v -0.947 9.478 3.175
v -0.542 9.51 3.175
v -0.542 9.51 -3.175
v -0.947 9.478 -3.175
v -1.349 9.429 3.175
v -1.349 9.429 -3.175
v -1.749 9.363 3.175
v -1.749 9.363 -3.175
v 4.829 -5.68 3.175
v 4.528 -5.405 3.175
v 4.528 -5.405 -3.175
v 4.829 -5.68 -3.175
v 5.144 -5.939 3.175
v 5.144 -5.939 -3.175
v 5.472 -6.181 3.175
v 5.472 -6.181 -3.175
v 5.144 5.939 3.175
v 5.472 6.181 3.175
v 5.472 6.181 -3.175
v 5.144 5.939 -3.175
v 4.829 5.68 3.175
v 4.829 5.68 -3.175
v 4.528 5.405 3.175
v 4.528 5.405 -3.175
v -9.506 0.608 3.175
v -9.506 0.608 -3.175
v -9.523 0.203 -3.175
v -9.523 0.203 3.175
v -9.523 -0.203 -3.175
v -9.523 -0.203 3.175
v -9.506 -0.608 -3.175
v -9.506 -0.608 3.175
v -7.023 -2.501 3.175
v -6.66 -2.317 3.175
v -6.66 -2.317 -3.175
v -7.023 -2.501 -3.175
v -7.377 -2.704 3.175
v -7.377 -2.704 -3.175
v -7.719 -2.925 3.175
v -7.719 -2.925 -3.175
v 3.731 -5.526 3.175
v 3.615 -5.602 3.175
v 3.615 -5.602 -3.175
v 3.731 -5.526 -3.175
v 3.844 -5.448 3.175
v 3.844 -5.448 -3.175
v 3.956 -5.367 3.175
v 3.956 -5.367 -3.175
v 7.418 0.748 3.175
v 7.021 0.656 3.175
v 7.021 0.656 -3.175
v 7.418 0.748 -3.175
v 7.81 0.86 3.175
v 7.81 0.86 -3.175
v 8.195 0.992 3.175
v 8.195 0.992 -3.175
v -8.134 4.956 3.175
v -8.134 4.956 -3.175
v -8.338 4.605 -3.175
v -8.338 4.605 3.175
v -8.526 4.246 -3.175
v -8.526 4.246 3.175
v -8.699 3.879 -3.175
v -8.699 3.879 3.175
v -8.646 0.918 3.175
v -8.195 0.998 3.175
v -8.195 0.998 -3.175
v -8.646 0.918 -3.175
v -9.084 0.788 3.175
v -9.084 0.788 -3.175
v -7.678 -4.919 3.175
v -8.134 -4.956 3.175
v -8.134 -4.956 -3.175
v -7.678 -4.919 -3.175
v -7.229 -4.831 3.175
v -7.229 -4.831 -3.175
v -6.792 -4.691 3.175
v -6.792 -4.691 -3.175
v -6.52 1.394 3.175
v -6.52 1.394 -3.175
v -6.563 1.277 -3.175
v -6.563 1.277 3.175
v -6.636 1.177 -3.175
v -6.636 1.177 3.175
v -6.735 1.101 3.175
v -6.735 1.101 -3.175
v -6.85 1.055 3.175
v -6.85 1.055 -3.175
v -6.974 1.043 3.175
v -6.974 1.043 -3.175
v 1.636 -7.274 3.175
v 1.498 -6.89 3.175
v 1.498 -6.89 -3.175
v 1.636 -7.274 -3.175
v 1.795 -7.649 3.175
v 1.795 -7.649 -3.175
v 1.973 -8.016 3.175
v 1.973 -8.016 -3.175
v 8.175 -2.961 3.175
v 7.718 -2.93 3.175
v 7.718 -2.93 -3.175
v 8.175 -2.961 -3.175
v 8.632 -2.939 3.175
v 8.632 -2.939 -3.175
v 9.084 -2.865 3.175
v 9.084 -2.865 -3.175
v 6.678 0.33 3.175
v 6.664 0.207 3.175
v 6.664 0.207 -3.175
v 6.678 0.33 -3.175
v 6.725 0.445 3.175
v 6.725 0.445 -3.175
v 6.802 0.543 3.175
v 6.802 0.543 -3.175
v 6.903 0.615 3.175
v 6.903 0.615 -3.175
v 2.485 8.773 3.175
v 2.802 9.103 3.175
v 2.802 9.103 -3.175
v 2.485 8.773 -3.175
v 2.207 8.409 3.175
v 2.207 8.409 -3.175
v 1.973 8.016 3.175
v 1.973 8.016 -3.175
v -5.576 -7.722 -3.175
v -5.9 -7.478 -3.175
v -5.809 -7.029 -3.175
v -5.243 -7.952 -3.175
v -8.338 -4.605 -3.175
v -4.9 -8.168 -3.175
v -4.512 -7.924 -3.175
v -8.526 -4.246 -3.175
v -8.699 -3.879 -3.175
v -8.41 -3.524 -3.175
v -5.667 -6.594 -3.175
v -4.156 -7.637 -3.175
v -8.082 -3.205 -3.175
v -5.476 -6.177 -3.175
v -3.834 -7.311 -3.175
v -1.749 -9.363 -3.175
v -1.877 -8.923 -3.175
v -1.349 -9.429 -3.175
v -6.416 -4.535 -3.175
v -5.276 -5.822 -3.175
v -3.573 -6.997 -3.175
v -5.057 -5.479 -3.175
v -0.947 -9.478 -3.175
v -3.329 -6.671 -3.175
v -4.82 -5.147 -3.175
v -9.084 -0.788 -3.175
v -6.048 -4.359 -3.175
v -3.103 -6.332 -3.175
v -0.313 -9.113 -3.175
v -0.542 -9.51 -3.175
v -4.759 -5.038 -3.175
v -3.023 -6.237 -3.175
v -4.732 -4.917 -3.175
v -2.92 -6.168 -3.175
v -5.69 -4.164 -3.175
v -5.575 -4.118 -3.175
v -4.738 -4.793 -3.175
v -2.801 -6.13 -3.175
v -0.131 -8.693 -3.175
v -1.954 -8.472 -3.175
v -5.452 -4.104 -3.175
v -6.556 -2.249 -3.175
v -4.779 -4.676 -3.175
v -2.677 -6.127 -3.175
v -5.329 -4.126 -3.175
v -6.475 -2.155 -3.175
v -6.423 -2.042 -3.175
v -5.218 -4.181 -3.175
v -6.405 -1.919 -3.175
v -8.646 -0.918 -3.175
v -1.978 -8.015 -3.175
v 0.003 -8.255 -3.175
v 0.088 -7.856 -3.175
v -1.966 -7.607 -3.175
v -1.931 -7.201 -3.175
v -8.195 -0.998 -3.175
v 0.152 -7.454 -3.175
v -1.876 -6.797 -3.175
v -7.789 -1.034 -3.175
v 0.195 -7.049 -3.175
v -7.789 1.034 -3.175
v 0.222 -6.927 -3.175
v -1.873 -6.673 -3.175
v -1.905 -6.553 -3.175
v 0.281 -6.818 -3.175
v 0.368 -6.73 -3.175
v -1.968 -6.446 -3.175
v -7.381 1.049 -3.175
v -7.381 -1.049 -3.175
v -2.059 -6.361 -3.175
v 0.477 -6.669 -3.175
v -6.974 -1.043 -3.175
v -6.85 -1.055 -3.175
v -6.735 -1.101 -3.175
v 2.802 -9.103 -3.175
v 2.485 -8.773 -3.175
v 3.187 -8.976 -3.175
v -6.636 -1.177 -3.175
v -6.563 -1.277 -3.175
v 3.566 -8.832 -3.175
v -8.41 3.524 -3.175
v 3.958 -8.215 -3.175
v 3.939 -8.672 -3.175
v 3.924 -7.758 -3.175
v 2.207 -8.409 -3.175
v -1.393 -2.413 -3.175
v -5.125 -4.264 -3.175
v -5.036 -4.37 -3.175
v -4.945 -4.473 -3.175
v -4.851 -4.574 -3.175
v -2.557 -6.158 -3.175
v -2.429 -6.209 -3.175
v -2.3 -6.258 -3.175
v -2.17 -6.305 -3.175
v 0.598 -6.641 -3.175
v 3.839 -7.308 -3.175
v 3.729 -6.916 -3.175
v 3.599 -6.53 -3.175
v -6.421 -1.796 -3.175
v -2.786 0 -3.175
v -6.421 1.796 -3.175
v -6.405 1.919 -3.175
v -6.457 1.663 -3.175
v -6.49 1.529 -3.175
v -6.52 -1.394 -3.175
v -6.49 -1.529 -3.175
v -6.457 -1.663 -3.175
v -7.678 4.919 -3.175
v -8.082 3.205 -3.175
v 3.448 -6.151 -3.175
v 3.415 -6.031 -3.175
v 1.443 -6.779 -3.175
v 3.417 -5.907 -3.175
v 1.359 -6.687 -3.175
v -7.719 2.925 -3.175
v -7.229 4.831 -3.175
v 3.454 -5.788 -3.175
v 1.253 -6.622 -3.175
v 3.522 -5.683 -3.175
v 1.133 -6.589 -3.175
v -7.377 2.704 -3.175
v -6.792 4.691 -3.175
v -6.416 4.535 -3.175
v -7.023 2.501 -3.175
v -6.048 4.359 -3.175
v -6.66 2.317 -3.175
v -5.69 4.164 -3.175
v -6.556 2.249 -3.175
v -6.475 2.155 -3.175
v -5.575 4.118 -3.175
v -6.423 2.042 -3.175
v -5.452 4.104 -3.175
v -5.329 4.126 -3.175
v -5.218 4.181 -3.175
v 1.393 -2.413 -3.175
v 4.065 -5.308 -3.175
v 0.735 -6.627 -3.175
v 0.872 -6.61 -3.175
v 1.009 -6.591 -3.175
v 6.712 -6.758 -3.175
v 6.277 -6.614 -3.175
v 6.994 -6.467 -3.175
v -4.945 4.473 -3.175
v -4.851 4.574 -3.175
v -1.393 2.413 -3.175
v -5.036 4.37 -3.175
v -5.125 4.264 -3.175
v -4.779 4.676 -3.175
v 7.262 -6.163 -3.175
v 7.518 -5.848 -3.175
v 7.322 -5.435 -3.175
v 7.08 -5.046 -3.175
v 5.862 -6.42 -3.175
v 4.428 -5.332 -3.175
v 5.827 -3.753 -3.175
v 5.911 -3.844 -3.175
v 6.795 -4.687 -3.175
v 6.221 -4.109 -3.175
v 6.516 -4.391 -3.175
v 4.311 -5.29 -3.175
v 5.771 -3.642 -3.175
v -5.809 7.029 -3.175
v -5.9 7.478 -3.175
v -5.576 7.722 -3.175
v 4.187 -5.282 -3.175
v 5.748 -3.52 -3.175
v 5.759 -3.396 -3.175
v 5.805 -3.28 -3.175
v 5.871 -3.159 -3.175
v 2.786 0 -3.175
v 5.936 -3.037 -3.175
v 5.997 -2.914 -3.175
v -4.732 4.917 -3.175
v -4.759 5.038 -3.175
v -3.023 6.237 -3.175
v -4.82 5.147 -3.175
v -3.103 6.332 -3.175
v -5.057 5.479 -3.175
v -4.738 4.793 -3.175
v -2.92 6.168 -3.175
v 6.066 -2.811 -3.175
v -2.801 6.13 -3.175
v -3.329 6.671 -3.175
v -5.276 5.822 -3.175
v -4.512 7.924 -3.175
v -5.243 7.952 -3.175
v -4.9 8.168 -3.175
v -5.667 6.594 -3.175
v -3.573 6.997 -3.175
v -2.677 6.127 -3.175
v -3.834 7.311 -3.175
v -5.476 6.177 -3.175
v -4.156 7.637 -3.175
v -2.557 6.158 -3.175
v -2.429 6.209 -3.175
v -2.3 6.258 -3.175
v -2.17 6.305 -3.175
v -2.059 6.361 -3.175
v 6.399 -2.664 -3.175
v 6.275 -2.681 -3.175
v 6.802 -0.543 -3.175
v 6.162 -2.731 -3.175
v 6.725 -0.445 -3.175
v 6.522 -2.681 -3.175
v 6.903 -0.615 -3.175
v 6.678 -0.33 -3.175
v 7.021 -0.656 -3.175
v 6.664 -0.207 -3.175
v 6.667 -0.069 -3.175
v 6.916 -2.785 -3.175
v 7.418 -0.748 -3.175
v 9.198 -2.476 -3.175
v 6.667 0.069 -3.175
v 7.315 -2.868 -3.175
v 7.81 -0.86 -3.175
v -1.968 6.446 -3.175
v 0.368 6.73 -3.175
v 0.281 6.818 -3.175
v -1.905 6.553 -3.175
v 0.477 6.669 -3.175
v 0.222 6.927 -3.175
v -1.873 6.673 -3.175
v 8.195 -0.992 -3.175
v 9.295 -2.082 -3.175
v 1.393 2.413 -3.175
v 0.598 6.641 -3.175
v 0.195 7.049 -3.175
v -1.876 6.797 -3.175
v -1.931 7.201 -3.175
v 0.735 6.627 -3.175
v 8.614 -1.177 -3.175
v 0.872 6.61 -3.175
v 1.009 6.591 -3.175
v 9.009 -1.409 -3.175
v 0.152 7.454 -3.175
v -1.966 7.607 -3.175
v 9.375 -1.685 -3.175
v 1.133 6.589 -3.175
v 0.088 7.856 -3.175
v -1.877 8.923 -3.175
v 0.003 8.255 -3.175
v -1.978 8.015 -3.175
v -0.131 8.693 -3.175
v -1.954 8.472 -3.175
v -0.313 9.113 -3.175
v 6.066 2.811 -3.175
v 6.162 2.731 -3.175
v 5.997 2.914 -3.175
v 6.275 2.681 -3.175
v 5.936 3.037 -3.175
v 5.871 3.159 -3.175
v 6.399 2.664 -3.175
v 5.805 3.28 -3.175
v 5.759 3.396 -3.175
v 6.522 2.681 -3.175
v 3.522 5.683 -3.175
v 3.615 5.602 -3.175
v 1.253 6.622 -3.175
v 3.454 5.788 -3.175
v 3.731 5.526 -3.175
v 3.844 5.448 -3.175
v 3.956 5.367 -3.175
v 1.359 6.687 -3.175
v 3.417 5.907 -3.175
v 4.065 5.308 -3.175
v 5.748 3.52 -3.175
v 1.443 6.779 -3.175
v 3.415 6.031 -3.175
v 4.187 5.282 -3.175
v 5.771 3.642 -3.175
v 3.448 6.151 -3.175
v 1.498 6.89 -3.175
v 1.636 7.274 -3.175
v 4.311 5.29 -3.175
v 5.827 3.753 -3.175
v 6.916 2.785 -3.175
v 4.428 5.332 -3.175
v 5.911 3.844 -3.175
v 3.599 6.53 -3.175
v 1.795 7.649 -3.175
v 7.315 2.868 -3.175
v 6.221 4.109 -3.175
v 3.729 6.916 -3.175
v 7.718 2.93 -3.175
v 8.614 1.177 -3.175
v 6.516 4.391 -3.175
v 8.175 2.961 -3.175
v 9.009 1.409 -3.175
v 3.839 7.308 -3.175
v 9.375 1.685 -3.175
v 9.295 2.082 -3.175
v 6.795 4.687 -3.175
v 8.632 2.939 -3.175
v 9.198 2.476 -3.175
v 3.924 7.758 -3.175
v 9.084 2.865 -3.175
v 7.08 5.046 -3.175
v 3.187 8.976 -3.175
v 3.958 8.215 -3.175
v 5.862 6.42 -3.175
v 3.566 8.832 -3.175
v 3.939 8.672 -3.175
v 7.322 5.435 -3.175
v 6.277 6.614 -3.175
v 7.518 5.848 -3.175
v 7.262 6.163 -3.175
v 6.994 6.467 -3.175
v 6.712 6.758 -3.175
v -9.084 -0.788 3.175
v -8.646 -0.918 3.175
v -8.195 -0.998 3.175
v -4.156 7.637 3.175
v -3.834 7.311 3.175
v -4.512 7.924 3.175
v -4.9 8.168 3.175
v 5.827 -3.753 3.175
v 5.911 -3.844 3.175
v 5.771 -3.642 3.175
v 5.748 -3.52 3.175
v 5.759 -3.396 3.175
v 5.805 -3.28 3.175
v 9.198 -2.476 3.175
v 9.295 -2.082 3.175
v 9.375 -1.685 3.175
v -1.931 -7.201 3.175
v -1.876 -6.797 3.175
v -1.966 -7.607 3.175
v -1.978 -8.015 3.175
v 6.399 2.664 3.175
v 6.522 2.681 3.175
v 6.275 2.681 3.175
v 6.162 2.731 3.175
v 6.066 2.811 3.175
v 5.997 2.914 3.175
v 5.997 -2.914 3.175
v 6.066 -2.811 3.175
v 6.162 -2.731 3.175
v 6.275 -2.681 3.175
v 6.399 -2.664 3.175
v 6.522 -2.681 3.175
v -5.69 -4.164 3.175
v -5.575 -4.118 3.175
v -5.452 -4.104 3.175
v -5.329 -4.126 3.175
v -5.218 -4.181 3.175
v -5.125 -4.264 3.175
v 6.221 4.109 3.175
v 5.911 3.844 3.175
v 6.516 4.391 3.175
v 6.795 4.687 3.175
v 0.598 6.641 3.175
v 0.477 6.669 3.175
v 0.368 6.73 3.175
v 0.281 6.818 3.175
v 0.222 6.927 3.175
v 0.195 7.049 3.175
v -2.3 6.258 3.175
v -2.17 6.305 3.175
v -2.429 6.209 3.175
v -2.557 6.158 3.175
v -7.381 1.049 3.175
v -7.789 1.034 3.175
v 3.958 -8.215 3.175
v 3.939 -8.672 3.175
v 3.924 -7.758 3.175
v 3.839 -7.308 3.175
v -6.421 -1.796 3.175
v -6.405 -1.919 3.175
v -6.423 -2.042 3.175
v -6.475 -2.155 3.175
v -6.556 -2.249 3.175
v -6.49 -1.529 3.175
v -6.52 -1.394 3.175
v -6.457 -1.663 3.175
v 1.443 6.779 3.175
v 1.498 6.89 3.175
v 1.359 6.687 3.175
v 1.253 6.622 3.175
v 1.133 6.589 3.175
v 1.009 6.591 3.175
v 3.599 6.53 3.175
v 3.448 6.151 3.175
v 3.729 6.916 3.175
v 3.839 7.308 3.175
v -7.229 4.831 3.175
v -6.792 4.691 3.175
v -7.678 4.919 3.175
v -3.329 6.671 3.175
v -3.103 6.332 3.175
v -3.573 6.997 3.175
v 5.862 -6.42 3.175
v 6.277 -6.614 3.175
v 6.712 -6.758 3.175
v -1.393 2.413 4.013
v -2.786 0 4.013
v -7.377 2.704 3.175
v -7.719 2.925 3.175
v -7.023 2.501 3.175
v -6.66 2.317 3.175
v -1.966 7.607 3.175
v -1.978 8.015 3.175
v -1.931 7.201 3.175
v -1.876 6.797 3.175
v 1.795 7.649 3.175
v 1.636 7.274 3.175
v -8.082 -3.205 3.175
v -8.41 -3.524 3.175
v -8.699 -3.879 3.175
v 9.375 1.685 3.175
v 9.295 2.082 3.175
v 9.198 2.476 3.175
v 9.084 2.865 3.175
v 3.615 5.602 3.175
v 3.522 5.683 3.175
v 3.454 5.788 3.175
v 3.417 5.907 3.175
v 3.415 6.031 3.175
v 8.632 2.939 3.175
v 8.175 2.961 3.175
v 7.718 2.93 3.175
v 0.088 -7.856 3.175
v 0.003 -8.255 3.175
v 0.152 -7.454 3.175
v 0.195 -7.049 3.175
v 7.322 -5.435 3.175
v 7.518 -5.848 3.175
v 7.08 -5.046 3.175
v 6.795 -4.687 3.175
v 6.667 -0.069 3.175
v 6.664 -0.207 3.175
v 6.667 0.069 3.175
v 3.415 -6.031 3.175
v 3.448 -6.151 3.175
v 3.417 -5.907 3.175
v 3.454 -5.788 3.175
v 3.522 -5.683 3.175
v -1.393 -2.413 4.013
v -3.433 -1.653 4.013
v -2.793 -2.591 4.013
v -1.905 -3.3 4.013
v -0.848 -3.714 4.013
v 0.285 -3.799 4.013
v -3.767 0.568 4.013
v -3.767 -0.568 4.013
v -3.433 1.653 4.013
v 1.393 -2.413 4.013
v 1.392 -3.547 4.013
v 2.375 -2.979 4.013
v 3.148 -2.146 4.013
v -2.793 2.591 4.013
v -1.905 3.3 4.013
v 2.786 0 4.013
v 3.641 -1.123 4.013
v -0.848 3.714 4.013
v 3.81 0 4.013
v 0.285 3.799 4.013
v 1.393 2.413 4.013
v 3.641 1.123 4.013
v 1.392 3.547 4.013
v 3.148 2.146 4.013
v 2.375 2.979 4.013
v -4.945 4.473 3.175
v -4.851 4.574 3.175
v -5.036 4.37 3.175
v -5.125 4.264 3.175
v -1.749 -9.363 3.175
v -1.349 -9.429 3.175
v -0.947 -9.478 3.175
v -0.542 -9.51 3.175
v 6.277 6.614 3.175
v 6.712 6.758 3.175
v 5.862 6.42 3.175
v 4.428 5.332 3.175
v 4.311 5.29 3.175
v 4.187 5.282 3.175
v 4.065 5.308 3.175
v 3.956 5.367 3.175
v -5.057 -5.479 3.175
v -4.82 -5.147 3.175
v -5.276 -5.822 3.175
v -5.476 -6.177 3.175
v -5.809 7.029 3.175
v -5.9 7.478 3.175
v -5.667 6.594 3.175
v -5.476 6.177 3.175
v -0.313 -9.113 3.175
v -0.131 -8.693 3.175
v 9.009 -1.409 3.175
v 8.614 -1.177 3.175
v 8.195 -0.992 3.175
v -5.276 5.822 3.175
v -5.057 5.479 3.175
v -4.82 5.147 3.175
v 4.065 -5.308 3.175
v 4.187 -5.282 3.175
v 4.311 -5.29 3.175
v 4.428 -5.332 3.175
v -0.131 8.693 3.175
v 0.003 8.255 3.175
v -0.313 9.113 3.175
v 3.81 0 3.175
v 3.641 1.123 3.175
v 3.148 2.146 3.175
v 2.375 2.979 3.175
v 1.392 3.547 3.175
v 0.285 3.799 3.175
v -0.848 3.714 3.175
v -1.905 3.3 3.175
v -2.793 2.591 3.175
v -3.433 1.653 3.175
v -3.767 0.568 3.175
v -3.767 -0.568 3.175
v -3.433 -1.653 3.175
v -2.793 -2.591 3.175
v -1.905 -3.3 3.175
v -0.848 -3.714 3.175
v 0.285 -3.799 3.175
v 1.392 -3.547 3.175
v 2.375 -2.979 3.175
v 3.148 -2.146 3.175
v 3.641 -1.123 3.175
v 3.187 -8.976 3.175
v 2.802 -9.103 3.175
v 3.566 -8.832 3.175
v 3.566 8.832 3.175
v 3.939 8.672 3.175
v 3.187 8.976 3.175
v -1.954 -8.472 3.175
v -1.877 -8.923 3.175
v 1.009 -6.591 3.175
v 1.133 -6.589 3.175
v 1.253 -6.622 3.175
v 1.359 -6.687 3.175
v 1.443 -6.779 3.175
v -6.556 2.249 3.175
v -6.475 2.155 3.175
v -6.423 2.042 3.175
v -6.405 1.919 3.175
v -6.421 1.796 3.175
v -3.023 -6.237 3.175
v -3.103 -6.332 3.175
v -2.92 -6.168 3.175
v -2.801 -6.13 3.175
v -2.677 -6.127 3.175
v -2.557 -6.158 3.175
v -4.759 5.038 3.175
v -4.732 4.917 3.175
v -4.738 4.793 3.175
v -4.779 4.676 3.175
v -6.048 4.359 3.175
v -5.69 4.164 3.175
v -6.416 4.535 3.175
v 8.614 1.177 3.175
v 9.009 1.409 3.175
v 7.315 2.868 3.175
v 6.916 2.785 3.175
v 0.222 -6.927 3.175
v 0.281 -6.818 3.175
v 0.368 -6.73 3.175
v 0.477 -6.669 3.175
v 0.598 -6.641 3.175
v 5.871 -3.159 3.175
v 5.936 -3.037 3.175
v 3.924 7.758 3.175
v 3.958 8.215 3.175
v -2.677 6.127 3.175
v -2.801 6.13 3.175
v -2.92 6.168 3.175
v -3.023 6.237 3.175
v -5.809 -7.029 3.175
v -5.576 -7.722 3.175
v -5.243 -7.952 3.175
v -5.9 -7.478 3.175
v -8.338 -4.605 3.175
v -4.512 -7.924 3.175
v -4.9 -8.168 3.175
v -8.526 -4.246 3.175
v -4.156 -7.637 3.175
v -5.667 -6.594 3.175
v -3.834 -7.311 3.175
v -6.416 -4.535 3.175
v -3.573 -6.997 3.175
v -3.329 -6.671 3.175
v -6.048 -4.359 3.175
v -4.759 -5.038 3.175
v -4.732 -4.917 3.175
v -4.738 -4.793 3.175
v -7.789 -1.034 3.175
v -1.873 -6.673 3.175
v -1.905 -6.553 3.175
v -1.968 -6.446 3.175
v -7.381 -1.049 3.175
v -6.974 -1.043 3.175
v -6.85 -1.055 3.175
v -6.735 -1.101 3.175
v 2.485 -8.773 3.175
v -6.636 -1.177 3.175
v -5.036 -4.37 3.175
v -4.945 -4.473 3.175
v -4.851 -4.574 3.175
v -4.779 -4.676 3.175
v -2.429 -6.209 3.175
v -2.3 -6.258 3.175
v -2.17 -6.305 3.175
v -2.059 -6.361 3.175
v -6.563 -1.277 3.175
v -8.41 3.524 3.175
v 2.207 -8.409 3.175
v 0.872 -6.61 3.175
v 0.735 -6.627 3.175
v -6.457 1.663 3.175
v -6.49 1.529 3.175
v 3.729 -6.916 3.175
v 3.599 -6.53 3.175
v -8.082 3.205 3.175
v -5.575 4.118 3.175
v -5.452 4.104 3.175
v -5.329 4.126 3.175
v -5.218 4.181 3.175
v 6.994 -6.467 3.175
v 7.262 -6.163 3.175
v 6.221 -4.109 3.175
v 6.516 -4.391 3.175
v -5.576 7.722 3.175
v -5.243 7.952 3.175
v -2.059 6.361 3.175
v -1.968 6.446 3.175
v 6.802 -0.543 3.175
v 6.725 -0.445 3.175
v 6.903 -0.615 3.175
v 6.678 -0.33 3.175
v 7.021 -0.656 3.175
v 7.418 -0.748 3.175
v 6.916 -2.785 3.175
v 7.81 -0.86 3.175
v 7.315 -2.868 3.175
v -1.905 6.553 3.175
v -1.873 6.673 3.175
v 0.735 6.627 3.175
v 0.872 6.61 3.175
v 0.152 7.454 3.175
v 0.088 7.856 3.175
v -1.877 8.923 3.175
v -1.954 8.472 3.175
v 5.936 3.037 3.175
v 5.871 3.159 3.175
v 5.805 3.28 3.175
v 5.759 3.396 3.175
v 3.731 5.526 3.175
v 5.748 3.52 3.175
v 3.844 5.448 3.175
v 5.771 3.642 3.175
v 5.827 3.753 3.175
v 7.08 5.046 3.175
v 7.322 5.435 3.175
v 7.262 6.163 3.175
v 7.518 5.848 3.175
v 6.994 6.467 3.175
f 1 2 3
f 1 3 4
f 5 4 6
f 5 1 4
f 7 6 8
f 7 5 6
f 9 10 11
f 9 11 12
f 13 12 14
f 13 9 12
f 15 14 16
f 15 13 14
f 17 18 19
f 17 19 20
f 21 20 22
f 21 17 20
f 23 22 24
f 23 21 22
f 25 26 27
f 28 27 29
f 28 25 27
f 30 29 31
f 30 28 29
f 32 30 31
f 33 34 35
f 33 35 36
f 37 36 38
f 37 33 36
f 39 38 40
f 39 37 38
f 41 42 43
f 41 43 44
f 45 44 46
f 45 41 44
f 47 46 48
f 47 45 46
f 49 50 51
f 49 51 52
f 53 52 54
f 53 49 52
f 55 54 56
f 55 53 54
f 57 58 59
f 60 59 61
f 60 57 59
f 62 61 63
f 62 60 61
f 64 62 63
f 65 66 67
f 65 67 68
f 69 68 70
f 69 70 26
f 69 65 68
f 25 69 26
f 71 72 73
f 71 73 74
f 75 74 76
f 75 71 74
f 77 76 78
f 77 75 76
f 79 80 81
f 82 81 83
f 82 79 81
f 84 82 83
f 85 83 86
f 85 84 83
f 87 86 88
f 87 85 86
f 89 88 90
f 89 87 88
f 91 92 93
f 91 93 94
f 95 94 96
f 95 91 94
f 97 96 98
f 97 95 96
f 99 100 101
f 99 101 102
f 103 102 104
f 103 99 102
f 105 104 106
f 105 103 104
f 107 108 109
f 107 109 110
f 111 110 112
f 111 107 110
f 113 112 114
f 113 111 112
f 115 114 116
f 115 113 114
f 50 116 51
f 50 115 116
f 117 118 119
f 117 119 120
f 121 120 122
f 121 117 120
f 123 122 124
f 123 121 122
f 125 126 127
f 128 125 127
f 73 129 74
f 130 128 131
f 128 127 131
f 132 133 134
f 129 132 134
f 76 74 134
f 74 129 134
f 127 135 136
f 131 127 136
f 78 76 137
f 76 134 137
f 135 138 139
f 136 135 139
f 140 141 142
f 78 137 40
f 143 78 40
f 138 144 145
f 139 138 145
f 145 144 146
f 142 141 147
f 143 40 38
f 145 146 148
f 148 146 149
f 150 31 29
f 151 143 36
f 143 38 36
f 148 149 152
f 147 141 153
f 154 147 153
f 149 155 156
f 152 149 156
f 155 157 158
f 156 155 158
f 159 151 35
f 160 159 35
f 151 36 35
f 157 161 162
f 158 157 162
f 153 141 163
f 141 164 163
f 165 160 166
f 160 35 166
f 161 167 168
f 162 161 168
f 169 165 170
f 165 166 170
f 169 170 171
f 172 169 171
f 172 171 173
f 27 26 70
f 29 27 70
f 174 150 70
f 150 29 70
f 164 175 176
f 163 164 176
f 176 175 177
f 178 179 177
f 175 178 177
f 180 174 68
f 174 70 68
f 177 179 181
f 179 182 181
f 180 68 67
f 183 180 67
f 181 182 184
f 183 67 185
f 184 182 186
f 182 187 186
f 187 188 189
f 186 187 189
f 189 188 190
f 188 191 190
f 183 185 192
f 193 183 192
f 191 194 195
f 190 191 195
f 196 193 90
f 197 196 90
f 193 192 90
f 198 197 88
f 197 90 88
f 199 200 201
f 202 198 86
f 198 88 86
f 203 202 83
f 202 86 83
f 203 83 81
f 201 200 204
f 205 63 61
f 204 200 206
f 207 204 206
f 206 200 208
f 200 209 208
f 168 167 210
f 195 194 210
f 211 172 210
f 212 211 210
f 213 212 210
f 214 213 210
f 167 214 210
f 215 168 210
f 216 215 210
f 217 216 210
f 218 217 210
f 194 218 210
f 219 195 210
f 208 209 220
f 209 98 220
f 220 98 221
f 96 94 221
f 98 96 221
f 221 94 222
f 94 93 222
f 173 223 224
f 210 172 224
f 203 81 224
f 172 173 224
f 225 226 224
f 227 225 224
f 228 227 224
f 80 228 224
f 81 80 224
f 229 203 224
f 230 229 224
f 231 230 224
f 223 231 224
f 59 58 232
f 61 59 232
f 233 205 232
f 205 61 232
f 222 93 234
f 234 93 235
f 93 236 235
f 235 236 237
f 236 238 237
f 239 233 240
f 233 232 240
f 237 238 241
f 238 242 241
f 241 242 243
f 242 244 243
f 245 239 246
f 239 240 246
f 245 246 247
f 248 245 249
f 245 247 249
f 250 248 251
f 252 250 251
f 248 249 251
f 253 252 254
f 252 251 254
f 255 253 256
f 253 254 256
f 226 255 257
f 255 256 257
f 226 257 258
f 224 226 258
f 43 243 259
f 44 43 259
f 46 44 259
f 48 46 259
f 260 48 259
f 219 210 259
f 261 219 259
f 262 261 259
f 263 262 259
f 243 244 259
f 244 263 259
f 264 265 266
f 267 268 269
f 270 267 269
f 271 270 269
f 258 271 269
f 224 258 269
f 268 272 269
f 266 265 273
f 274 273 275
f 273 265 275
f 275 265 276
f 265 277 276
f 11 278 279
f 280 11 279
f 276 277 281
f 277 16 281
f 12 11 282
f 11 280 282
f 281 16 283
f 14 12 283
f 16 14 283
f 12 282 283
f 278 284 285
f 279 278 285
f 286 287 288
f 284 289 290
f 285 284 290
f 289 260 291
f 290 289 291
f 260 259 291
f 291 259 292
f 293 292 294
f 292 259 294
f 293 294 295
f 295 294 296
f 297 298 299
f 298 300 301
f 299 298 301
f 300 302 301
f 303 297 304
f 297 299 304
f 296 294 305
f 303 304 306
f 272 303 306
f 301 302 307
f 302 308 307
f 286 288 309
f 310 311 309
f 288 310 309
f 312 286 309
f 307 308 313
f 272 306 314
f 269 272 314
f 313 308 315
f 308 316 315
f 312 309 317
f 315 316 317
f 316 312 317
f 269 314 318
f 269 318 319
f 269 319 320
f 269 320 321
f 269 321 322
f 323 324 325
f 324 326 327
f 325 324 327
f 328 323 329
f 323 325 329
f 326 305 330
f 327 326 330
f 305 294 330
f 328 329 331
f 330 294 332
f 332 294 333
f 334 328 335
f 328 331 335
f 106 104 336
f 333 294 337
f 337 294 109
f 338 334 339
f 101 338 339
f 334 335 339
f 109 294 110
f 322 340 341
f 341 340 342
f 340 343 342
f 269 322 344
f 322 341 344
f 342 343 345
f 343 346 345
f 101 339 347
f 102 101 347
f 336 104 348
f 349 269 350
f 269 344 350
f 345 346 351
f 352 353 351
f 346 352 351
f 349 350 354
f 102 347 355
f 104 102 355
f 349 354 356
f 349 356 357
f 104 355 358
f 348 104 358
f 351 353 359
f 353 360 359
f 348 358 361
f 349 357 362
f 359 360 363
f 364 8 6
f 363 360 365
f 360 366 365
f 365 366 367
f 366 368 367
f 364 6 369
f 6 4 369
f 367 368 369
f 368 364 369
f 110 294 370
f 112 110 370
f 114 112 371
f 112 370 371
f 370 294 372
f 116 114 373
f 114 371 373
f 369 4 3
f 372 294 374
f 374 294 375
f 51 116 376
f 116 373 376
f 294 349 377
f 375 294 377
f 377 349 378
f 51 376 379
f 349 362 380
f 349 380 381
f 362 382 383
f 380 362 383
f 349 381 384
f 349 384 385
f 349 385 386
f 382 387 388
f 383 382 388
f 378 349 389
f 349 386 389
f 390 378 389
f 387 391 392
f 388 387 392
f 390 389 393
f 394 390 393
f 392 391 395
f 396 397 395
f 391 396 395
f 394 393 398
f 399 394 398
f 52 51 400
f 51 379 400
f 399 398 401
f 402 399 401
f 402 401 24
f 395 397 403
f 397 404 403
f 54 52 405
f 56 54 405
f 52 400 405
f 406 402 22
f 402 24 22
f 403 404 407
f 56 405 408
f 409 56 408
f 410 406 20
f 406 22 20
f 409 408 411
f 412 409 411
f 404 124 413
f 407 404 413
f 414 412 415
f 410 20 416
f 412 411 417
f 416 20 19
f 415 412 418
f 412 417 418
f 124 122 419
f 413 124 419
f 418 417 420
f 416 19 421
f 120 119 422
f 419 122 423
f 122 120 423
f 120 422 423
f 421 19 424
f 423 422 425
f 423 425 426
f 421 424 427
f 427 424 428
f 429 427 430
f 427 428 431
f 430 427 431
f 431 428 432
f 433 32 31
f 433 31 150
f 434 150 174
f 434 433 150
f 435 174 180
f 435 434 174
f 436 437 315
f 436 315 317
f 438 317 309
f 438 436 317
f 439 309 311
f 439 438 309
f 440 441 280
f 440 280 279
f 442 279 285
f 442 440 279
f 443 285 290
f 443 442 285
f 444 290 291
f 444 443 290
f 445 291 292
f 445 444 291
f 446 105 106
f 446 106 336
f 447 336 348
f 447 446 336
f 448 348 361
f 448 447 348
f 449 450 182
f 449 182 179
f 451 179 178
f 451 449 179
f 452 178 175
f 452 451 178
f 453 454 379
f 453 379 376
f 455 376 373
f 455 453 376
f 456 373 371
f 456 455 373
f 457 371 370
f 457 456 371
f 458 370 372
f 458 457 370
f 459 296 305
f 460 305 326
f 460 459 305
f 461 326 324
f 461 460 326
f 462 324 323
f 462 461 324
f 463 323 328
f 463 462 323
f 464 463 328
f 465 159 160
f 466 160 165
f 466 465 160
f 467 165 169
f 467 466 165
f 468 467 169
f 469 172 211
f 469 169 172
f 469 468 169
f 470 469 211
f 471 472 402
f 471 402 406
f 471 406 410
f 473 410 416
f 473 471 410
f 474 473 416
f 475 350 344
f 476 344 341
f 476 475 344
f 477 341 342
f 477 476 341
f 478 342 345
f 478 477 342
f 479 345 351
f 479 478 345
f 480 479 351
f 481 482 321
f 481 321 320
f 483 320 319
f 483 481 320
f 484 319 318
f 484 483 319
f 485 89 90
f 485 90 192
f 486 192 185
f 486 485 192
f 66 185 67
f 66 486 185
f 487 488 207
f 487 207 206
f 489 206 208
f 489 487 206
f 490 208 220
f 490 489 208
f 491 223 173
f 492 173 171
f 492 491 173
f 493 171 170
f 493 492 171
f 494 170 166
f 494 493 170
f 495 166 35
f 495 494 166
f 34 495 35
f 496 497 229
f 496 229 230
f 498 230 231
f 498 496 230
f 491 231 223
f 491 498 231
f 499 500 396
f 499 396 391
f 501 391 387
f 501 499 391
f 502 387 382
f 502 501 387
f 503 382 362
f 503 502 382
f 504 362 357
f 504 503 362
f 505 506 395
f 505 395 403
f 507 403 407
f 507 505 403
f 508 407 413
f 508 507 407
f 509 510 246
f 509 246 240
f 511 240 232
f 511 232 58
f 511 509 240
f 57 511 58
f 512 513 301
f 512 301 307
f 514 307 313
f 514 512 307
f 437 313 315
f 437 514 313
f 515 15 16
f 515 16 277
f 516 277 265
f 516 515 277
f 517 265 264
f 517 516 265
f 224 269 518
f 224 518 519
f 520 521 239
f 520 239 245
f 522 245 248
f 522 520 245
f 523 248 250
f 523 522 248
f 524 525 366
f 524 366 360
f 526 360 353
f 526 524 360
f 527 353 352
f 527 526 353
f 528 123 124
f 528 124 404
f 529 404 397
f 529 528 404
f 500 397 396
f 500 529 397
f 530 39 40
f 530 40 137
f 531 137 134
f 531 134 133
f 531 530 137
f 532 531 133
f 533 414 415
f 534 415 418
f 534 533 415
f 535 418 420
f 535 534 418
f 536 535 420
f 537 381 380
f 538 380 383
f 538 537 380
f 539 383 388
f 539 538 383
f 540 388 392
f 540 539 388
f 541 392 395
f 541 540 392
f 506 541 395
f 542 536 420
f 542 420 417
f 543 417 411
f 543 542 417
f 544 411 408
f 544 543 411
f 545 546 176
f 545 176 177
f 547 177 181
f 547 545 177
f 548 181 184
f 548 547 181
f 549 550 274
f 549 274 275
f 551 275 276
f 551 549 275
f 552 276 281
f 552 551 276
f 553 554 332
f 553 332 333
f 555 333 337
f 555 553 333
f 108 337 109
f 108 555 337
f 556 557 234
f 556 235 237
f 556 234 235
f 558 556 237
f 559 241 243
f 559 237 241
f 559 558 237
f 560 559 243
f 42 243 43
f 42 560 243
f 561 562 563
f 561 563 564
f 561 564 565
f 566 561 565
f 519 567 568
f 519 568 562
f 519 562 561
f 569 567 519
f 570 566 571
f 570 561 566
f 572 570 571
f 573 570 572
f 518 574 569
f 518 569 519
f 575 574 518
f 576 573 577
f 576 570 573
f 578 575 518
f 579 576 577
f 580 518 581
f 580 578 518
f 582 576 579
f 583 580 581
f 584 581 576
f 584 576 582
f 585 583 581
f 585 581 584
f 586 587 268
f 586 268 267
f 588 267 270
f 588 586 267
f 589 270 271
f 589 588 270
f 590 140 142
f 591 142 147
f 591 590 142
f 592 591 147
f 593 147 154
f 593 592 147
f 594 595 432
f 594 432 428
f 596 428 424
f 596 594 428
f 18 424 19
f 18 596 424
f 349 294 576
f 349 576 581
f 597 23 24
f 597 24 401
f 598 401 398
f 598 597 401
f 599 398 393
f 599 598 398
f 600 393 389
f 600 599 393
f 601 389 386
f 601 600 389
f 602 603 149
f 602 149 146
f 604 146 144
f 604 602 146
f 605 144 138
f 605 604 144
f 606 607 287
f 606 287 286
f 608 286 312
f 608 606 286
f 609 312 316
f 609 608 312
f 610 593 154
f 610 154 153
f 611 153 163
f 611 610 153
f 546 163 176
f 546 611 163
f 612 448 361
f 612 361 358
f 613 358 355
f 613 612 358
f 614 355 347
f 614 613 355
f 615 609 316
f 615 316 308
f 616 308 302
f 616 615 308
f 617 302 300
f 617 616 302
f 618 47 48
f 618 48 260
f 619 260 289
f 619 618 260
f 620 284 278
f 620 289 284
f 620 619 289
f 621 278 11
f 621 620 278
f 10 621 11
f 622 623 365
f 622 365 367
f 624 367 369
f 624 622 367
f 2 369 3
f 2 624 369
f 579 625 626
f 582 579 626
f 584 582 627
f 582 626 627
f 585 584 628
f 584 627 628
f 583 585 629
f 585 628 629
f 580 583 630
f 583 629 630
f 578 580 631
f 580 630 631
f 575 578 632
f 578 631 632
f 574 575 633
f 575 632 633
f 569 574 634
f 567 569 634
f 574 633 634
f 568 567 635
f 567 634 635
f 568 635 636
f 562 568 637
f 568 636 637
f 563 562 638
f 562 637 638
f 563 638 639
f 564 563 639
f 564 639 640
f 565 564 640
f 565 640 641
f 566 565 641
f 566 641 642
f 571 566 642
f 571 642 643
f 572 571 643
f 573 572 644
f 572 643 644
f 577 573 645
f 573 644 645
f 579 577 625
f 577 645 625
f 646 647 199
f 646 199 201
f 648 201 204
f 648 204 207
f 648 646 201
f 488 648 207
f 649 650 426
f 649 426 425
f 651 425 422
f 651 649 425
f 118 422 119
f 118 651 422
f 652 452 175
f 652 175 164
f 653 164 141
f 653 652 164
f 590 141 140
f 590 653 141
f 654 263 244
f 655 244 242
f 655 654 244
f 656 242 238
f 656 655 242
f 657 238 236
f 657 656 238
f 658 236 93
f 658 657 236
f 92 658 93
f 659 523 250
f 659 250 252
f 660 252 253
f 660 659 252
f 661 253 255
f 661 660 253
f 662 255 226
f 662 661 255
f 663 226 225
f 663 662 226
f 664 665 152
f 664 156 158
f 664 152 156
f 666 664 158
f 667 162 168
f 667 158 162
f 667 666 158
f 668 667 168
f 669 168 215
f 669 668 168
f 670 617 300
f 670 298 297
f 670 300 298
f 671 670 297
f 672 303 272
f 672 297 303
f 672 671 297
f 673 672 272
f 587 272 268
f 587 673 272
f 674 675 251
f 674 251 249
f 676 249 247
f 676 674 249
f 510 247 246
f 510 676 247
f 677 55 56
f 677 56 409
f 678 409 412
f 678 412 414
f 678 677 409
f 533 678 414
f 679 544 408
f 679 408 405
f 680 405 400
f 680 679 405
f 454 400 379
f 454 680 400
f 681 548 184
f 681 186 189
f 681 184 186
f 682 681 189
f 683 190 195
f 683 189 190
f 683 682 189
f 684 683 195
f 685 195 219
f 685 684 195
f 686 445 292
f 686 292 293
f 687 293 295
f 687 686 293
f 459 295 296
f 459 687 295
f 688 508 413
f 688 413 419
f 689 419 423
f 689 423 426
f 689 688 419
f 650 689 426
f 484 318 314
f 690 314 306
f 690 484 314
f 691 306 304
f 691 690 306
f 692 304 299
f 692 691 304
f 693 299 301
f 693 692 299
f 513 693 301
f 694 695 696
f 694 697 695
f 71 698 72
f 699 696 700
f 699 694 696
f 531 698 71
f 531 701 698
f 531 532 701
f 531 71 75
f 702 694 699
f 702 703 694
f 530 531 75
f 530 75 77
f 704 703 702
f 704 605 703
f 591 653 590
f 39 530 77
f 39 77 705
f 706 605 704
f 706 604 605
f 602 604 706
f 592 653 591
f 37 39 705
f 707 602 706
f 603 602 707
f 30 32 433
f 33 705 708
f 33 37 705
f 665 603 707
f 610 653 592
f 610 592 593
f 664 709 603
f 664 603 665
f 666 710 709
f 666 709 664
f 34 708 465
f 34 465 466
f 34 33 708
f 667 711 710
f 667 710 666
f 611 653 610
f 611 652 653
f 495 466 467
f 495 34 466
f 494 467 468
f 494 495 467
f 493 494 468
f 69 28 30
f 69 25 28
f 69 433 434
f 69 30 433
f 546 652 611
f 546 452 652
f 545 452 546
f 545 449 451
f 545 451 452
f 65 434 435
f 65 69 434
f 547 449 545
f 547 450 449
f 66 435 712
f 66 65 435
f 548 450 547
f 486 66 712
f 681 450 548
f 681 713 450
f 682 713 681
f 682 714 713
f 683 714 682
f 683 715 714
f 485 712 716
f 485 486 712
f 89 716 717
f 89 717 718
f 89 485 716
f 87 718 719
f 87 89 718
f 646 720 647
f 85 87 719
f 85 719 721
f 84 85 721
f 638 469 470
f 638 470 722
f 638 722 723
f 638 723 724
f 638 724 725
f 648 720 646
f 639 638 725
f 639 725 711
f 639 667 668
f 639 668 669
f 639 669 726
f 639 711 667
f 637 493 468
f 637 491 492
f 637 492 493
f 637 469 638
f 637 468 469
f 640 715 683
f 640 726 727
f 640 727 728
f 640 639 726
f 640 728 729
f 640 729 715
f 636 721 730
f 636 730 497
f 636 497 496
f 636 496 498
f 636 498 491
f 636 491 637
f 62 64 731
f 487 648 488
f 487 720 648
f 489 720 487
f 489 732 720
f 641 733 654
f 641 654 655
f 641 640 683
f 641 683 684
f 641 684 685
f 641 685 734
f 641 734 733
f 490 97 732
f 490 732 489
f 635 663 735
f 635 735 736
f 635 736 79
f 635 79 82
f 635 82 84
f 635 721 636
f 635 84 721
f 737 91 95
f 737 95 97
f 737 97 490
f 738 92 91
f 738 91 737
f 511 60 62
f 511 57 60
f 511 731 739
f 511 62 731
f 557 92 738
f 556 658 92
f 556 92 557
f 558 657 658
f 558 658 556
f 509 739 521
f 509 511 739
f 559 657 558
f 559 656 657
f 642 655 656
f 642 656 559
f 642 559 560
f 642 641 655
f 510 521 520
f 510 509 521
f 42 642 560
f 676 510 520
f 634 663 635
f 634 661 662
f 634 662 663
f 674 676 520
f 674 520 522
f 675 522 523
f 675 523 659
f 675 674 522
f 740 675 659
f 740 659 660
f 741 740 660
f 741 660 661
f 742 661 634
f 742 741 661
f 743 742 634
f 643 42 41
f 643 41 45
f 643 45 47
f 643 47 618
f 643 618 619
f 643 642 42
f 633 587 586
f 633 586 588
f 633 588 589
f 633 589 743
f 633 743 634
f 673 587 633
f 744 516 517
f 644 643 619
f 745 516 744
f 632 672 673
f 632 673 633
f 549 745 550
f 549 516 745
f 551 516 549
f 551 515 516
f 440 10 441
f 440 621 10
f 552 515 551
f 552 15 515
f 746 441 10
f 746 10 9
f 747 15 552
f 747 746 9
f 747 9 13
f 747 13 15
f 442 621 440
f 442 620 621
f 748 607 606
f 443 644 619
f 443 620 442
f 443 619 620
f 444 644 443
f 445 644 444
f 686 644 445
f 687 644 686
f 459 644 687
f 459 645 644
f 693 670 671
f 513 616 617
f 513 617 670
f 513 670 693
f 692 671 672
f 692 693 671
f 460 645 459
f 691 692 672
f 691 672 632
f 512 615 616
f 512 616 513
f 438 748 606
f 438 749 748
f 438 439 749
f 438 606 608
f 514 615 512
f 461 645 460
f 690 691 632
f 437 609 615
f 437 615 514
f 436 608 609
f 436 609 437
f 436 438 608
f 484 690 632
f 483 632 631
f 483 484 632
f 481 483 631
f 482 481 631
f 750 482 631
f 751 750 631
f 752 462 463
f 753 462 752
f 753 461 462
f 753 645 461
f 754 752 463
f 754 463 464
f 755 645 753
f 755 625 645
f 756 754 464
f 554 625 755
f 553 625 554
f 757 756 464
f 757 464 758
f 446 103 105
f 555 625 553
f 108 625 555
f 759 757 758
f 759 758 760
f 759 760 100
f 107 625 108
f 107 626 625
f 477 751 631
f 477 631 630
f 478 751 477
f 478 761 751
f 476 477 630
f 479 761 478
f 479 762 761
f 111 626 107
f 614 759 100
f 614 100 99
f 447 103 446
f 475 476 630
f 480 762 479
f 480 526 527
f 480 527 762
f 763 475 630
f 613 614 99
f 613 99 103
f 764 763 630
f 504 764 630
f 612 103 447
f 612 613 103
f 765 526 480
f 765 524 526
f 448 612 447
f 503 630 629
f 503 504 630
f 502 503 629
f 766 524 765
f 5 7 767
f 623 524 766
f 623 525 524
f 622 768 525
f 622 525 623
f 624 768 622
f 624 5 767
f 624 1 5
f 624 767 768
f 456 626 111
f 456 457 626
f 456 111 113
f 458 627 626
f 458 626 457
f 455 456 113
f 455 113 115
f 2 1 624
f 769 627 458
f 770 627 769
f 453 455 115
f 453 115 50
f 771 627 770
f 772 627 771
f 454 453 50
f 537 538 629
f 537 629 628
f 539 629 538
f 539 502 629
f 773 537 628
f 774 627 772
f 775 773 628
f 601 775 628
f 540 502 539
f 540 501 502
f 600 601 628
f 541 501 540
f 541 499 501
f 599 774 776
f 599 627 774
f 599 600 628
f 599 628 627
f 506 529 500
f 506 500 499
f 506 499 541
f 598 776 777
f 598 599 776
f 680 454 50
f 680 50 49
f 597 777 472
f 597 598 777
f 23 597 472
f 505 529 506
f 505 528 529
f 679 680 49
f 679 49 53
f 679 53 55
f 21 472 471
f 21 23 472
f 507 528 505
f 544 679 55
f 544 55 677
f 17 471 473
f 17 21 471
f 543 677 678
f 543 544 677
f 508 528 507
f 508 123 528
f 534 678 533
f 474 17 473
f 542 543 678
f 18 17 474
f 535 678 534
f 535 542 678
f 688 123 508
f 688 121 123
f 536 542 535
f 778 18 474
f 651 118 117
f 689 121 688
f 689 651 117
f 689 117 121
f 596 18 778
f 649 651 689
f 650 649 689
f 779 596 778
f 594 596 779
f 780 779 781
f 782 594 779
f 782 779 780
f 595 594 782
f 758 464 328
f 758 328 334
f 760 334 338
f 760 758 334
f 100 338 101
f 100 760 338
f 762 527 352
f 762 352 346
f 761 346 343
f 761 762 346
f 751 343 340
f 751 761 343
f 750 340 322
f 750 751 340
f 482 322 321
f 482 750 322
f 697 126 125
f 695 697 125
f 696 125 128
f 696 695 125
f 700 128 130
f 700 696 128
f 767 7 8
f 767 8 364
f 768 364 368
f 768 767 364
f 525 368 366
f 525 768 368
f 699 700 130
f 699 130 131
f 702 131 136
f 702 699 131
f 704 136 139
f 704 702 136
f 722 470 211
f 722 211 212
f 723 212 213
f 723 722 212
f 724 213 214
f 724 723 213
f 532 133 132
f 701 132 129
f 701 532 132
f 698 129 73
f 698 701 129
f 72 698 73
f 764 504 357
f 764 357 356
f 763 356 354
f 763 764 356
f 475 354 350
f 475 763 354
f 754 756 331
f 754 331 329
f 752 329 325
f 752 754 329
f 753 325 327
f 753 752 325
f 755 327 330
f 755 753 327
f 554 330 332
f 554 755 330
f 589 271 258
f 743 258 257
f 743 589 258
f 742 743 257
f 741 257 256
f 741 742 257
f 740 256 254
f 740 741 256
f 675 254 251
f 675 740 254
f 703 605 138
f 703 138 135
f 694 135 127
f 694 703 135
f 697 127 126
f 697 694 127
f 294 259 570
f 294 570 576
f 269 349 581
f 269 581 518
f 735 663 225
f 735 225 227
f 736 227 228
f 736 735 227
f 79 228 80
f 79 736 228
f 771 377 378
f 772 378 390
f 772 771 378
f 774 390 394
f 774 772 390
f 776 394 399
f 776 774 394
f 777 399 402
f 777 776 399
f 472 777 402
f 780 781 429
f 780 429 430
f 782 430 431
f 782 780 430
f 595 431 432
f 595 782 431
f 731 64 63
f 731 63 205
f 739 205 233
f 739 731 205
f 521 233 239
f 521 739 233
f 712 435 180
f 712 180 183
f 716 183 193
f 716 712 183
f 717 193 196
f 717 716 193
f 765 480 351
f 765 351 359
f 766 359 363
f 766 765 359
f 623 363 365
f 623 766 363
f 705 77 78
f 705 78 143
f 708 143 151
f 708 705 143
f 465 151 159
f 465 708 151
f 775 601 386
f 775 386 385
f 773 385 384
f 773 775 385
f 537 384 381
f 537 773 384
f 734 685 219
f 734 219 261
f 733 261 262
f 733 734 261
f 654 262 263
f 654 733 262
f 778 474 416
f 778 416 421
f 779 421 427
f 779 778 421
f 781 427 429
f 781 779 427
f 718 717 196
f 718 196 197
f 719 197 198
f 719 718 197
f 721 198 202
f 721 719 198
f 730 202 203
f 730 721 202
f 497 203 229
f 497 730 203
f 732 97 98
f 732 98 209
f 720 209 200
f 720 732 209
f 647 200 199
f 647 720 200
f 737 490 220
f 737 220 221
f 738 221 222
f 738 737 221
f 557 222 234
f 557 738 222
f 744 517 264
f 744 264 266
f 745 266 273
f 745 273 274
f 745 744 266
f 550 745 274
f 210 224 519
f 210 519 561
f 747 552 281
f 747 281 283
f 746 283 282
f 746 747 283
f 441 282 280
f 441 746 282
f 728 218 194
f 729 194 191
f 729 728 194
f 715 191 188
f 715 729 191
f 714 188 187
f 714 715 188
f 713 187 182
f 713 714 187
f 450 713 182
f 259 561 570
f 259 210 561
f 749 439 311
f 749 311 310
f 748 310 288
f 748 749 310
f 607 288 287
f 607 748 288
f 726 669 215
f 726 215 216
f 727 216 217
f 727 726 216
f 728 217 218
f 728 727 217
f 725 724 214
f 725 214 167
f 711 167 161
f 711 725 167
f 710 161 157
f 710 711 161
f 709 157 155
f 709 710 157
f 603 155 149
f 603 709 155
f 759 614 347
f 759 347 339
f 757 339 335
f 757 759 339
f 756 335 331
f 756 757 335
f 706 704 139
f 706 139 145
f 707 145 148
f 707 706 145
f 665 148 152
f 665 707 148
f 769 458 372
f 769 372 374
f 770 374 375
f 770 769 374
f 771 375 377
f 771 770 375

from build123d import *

# Parameters (mm, degrees)
SKETCH1_R           = 9.525
ROUND_STOCK_DEPTH   = 3.175
SINGLE_TOOTH_DEPTH  = 15.892070037
TOOTH_PATTERN_COUNT = 13
CUT_EXTRUDE1_DEPTH  = 15.882187212
SKETCH8_R           = 3.81
BOSS_EXTRUDE1_DEPTH = 0.8382


with BuildPart() as part:
    # Sketch1 → Round Stock (new, symmetric)
    with BuildSketch(Plane.XY):
        Circle(SKETCH1_R)
    extrude(amount=ROUND_STOCK_DEPTH, both=True)

    # Sketch2 → Single Tooth (cut, through all)
    with BuildSketch(Plane.XY.offset(3.175)):
        with BuildLine():
            ThreePointArc((-8.699219347, -3.879330837), (-9.248220811, -2.279481702), (-9.505591122, -0.607751944))
            ThreePointArc((-9.505591122, -0.607751944), (-8.866874127, -0.859264513), (-8.194501154, -0.997585))
            ThreePointArc((-8.194501154, -0.997585), (-7.585039492, -1.044554082), (-6.973773022, -1.042846396))
            ThreePointArc((-6.973773022, -1.042846396), (-6.682727126, -1.135452938), (-6.520145475, -1.394008333))
            ThreePointArc((-6.520145475, -1.394008333), (-6.473754568, -1.595637192), (-6.421130074, -1.795729609))
            ThreePointArc((-6.421130074, -1.795729609), (-6.444932293, -2.100224502), (-6.659604229, -2.317479295))
            ThreePointArc((-6.659604229, -2.317479295), (-7.201647409, -2.600036906), (-7.71947129, -2.92485692))
            ThreePointArc((-7.71947129, -2.92485692), (-8.250547255, -3.35980093), (-8.699219347, -3.879330837))
        make_face()
    single_tooth = extrude(amount=-SINGLE_TOOTH_DEPTH, mode=Mode.SUBTRACT)

    # Tooth Pattern: Single Tooth ×13 about axis
    tooth_pattern_axis = Axis((0, 0, 50), (0, 0, -1))
    for i in range(1, TOOTH_PATTERN_COUNT):
        add(single_tooth.rotate(tooth_pattern_axis, i * 360 / TOOTH_PATTERN_COUNT), mode=Mode.SUBTRACT)

    # Sketch7 → Cut-Extrude1 (cut, through all)
    with BuildSketch(Plane(origin=(0, 0, -3.175), x_dir=(-1, 0, 0), z_dir=(0, 0, -1))):
        Polygon((1.3931462, -2.413), (2.786292399, 0), (1.3931462, 2.413), (-1.3931462, 2.413), (-2.786292399, 0), (-1.3931462, -2.413), align=None)
    extrude(amount=-CUT_EXTRUDE1_DEPTH, mode=Mode.SUBTRACT)

    # Sketch8 → Boss-Extrude1 (add)
    with BuildSketch(Plane.XY.offset(3.175)):
        Circle(SKETCH8_R)
        Polygon((-1.3931462, -2.413), (1.3931462, -2.413), (2.786292399, 0), (1.3931462, 2.413), (-1.3931462, 2.413), (-2.786292399, 0), align=None, mode=Mode.SUBTRACT)
    extrude(amount=BOSS_EXTRUDE1_DEPTH)


solid = part.part
